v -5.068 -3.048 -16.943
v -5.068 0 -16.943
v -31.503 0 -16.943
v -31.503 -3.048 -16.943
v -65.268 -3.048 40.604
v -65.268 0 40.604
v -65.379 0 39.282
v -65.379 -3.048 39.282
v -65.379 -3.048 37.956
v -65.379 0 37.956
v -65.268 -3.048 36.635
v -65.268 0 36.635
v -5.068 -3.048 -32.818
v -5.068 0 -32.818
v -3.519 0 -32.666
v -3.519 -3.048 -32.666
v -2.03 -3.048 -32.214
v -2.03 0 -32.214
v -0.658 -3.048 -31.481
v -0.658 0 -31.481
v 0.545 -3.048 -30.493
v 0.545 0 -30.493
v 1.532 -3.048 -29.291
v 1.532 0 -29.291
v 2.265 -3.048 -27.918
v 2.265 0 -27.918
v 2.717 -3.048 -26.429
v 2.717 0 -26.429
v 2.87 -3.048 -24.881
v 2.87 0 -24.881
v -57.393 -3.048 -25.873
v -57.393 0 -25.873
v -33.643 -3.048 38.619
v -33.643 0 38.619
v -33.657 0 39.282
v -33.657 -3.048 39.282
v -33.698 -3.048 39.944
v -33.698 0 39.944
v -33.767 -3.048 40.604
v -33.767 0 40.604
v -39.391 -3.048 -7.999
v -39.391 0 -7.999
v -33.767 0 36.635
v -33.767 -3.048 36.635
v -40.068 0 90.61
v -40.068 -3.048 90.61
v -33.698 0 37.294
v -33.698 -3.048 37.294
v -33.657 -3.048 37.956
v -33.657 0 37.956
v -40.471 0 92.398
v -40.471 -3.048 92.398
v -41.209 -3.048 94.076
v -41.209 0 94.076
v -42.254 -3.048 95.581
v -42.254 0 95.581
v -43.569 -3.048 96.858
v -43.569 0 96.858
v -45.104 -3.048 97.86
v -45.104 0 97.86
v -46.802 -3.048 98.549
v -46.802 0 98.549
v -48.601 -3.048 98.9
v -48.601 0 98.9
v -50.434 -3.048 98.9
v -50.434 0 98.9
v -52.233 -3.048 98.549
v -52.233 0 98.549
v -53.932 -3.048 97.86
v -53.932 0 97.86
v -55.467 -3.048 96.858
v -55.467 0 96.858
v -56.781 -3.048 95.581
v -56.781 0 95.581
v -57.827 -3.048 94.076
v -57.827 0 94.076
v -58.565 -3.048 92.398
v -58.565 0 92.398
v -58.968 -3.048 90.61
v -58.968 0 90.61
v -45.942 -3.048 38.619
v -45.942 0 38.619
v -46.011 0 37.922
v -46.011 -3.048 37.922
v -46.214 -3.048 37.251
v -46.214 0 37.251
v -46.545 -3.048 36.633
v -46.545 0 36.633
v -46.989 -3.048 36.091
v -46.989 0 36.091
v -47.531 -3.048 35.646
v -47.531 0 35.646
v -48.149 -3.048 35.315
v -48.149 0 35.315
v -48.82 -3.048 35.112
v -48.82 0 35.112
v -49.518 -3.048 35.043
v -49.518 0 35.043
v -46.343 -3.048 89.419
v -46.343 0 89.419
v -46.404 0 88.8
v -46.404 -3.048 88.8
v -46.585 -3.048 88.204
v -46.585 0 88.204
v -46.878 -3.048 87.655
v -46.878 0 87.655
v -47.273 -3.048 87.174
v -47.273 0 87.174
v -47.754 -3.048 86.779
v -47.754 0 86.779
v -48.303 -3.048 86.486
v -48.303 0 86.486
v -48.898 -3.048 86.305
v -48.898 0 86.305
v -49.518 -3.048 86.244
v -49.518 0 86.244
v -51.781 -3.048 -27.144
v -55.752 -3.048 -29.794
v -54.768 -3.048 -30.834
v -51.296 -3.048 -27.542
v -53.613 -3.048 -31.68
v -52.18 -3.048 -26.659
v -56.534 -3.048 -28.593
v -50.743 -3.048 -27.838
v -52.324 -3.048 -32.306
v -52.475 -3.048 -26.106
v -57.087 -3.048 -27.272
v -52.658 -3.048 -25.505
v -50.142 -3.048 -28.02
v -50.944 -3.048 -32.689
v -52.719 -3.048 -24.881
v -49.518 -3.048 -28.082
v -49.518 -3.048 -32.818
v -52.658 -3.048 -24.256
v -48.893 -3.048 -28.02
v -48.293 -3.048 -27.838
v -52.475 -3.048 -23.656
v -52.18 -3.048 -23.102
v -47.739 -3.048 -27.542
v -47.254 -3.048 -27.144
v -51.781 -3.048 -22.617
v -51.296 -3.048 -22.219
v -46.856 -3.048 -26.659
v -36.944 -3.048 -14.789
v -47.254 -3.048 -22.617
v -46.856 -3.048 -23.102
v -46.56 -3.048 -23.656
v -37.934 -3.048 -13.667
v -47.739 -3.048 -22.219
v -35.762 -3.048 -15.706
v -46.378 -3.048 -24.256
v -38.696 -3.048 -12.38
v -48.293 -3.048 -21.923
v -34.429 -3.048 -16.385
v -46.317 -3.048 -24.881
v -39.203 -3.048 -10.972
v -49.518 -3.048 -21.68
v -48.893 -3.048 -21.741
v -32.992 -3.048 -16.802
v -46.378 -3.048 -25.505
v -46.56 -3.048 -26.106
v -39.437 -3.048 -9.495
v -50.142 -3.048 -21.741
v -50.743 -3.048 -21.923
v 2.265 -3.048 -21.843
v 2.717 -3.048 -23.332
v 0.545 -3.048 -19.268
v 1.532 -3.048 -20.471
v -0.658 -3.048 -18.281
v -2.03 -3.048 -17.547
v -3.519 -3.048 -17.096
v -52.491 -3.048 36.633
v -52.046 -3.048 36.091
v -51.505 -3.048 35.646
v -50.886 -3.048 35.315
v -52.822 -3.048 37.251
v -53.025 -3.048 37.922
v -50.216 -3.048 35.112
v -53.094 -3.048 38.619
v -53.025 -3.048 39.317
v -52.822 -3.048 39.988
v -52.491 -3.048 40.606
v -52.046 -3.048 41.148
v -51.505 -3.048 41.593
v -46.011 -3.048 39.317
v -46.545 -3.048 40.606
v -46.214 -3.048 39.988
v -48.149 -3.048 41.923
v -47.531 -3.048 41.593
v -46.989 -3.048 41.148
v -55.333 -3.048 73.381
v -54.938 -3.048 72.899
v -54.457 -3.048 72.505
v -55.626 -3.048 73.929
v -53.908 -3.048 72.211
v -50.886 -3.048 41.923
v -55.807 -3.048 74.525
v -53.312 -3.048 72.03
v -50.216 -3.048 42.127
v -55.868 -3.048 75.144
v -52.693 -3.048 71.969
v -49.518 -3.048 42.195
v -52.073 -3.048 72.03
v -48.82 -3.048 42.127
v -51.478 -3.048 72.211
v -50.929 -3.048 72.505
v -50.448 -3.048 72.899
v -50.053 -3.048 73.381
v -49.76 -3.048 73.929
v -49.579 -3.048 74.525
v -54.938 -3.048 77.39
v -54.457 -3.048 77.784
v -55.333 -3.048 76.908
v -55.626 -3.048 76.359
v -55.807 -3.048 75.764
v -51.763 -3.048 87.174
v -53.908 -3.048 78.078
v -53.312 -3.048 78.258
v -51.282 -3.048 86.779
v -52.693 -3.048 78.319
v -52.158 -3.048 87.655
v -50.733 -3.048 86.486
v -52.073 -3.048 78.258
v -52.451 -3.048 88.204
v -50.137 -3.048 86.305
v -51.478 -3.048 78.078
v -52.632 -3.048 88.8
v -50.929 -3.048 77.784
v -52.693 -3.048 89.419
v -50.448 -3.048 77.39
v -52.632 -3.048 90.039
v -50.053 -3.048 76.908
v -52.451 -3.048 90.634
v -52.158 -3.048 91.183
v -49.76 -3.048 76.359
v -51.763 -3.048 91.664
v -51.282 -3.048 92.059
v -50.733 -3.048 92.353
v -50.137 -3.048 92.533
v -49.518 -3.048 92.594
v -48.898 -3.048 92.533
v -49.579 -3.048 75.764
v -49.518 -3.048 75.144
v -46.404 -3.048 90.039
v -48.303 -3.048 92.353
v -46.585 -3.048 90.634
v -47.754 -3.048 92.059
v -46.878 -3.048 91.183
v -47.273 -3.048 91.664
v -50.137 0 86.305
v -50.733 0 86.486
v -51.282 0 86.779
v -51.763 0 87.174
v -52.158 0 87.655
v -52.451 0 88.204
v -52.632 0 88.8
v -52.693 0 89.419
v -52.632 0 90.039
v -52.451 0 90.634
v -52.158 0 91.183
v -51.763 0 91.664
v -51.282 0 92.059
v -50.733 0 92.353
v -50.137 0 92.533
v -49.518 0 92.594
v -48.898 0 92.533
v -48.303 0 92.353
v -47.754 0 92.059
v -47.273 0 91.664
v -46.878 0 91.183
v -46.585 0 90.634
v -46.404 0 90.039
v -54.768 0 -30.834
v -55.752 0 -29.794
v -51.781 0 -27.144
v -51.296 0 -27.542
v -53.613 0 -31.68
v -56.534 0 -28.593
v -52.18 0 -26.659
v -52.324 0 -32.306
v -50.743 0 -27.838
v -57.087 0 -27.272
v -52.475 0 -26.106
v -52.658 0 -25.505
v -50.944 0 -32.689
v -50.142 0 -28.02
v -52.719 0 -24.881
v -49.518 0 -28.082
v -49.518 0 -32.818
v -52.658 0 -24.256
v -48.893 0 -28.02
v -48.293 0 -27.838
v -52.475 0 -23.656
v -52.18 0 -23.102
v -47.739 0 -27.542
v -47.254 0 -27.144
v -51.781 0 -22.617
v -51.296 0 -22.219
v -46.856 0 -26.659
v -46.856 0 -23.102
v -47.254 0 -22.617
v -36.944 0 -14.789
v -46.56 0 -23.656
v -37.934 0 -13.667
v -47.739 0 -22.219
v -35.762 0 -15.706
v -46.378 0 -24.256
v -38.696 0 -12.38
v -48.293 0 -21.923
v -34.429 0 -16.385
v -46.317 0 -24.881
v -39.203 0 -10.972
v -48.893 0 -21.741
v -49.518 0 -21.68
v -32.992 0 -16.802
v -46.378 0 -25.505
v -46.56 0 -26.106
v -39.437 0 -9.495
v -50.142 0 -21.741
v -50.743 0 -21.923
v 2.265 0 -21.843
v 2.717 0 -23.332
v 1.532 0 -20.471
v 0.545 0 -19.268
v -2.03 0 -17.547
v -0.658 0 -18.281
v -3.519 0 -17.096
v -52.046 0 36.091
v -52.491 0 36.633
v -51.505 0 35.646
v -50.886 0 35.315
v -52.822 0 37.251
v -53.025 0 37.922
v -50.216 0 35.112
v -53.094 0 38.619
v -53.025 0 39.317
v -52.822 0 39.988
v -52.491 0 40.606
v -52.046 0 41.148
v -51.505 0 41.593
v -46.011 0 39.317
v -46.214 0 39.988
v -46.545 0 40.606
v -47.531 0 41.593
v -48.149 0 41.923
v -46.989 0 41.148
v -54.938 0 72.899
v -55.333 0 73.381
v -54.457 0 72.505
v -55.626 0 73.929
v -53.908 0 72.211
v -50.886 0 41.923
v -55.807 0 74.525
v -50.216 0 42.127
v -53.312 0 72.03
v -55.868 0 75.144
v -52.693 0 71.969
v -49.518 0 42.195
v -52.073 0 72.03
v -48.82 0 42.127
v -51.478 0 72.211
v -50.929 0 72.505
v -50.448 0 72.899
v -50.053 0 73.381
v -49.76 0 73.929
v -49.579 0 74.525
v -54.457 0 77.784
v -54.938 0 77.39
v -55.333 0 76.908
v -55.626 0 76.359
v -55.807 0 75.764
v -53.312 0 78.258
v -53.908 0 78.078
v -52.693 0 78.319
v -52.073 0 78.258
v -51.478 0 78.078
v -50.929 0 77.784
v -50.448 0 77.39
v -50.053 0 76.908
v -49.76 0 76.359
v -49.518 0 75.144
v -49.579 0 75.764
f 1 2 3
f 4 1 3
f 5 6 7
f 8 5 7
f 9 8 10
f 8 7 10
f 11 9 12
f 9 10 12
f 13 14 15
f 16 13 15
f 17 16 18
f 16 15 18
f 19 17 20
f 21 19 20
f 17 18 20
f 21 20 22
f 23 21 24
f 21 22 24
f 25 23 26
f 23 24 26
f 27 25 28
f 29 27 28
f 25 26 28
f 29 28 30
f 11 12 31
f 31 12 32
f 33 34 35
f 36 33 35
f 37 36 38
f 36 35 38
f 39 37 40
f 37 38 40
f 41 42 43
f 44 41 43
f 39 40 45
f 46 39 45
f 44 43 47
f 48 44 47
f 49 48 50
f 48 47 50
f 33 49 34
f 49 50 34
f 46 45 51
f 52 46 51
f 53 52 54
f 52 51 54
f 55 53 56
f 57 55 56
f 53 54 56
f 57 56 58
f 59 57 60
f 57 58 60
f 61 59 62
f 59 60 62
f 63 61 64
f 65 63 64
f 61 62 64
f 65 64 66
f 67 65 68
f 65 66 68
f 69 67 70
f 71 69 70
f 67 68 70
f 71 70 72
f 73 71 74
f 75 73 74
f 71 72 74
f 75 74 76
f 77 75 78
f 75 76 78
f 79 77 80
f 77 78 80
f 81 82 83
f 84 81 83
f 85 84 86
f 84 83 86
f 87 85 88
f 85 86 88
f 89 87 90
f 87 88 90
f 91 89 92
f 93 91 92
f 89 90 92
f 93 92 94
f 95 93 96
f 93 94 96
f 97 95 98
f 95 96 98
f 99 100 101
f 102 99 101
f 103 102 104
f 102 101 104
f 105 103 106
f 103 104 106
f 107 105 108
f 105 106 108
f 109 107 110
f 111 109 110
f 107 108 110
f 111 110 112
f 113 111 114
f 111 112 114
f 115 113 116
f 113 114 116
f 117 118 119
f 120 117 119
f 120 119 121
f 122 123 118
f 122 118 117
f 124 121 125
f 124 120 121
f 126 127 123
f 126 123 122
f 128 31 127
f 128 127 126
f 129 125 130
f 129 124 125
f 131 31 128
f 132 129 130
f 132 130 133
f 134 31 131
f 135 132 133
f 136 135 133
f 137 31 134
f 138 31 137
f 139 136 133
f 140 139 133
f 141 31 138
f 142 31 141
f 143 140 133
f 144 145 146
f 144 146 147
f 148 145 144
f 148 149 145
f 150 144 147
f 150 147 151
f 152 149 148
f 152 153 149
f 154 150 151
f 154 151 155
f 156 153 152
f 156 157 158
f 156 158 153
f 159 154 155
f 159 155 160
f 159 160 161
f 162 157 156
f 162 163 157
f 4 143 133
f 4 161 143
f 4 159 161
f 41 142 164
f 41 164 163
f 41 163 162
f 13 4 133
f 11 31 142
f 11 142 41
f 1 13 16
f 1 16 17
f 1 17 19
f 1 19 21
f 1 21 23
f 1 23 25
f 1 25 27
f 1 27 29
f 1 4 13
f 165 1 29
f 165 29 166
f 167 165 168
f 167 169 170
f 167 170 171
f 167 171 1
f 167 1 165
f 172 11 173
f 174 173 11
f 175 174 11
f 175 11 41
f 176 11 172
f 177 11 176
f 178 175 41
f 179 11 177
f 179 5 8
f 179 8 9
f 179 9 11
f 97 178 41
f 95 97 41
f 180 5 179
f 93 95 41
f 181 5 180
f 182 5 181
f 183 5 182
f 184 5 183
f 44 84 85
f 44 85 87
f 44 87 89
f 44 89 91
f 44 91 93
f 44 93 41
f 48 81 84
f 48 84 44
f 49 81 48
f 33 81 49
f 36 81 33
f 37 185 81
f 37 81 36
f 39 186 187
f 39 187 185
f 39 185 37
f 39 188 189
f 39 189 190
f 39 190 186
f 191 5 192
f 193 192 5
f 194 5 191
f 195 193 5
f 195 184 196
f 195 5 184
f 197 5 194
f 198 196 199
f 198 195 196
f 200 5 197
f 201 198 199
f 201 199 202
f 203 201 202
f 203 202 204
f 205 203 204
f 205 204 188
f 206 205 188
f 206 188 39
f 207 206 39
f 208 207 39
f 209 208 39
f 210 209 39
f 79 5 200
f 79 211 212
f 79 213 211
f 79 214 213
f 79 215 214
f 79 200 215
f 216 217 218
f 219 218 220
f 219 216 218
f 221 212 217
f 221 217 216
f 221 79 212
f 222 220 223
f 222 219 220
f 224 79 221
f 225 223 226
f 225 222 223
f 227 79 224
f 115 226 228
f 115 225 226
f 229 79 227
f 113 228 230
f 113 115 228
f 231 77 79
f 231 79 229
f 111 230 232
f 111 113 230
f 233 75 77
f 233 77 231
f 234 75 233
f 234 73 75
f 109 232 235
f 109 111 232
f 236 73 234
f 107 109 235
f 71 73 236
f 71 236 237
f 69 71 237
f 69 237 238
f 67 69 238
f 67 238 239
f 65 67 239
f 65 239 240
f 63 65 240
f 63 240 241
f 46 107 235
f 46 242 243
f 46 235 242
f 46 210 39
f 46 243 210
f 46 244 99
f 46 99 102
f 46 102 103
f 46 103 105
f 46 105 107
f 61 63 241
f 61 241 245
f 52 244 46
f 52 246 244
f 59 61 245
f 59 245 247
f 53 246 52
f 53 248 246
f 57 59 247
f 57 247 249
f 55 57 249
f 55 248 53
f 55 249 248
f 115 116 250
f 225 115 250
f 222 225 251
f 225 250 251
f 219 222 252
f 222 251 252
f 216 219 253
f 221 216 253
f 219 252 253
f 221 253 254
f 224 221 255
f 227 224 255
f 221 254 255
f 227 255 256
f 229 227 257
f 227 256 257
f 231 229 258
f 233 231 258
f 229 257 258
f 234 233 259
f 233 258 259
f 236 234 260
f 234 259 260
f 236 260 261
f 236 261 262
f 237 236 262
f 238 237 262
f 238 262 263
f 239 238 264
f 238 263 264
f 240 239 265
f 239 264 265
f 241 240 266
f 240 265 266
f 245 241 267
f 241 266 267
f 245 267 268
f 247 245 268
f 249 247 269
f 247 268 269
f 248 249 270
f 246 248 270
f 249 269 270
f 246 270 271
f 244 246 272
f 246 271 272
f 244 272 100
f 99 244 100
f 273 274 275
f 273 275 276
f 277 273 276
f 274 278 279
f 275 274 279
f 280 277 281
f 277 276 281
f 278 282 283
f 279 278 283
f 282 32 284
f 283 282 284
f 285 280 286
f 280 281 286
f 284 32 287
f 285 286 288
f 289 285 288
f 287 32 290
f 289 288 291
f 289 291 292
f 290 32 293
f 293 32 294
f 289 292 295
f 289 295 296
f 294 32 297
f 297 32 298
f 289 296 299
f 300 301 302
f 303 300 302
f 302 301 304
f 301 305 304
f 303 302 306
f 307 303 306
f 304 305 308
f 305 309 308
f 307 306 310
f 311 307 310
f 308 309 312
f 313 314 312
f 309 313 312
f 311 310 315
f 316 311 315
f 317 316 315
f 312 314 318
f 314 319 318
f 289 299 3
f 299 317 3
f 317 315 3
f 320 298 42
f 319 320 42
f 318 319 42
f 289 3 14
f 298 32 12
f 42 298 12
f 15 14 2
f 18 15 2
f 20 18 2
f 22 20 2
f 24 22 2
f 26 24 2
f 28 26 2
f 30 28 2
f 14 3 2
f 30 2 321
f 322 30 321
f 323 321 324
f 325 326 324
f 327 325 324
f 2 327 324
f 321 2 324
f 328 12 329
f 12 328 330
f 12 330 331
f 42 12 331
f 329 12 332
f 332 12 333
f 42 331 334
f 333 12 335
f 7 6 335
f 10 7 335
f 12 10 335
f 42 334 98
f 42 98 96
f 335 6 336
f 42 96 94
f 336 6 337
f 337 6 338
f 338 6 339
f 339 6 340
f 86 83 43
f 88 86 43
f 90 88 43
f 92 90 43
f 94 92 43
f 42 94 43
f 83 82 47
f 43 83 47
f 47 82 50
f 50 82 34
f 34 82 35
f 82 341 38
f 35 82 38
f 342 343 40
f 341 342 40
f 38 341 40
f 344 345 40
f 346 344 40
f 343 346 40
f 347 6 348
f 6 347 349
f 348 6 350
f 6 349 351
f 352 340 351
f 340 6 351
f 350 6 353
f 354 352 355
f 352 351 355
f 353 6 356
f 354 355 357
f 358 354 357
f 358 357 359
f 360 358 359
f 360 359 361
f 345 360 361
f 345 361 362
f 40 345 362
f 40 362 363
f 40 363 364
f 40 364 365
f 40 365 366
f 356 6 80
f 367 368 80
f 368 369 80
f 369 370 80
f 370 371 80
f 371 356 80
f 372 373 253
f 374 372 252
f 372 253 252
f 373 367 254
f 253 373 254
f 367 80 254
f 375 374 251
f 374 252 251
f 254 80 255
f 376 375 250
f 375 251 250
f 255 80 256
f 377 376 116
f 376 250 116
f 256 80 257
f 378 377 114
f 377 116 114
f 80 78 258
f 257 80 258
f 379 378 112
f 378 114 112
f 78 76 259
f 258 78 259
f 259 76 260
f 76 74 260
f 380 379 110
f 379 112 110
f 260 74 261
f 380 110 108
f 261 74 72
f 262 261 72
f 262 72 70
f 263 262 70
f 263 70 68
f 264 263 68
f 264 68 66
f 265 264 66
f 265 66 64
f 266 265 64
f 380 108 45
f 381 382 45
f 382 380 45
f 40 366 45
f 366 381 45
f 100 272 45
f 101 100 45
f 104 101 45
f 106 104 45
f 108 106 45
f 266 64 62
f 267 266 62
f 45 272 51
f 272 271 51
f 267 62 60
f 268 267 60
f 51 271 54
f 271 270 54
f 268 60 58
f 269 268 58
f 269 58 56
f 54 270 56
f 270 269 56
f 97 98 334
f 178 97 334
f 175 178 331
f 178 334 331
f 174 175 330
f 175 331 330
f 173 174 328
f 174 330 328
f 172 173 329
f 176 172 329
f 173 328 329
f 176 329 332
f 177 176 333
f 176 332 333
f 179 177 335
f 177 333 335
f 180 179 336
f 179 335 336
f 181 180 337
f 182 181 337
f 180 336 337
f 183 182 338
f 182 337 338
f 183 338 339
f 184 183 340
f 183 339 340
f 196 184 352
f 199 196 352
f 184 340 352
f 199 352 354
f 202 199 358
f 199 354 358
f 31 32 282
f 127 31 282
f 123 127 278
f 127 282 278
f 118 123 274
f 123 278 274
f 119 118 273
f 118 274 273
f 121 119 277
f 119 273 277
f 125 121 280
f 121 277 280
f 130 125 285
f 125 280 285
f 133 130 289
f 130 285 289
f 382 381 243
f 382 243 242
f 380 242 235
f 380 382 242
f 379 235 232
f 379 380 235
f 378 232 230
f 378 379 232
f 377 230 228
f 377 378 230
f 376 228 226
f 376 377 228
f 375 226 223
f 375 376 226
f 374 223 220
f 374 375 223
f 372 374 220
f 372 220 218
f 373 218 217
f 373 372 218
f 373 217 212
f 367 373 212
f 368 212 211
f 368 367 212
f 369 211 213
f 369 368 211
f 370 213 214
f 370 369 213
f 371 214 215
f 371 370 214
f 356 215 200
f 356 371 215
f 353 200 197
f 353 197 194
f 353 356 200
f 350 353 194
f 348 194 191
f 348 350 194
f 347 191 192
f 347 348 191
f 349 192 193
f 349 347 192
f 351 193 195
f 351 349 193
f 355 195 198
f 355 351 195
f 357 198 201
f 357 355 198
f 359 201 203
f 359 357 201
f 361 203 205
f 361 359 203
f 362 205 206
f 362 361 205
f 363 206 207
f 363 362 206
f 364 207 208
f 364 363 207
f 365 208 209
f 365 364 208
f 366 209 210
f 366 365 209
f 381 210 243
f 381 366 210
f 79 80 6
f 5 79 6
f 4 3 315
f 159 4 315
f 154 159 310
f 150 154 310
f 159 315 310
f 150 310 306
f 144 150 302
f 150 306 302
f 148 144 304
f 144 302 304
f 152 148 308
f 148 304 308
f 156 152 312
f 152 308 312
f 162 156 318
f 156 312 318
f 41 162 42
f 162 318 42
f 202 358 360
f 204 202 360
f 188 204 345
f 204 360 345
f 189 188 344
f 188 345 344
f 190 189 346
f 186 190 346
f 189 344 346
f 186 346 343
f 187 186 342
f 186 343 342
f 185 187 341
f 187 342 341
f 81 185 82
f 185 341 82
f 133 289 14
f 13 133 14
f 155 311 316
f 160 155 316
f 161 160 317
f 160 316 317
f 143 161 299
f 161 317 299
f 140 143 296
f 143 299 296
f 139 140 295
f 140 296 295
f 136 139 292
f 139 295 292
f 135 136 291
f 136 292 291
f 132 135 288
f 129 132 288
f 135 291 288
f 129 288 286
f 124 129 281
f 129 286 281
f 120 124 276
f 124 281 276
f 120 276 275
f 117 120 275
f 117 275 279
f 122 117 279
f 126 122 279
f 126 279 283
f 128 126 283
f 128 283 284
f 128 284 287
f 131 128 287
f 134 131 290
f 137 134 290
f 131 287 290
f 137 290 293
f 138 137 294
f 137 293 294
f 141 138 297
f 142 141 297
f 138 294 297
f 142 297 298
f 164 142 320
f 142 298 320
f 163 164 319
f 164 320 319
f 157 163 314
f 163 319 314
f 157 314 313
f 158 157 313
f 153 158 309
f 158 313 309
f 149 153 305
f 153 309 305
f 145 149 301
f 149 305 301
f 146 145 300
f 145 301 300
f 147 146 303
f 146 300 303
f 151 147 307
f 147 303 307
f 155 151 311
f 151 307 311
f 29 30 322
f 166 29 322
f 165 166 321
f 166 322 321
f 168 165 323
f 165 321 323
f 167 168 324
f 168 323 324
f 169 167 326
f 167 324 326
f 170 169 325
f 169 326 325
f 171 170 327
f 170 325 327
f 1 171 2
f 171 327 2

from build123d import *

# Parameters (mm, degrees)
F0_R     = 3.175
F1_DEPTH = 3.048


with BuildPart() as f1:
    # F0 (on Front) → F1 (new body)
    with BuildSketch(Plane.XZ):
        with BuildLine():
            ThreePointArc((-58.9681591883, 90.6098637193), (-56.6616162241, 83.1190434099), (-49.5178662241, 79.8942387193))
            ThreePointArc((-49.5178662241, 79.8942387193), (-42.7826741332, 82.6840466285), (-39.9928662241, 89.4192387193))
            ThreePointArc((-39.9928662241, 89.4192387193), (-40.0115613298, 90.0157219613), (-40.0675732598, 90.6098637193))
            ThreePointArc((-40.0675732598, 90.6098637193), (-49.5178662241, 98.9442387193), (-58.9681591883, 90.6098637193))
        make_face()
        with BuildLine():
            ThreePointArc((-46.3428662241, 89.4192387193), (-47.2728021938, 87.1741746891), (-49.5178662241, 86.2442387193))
            ThreePointArc((-49.5178662241, 86.2442387193), (-51.7629302543, 91.6643027496), (-46.3428662241, 89.4192387193))
        make_face(mode=Mode.SUBTRACT)
        with BuildLine():
            ThreePointArc((-39.9928662241, 89.4192387193), (-42.7826741332, 82.6840466285), (-49.5178662241, 79.8942387193))
            Line((-49.5178662241, 79.8942387193), (-49.5178662241, 75.1444387193))
            Line((-49.5178662241, 75.1444387193), (-49.5178662241, 54.4942387193))
            ThreePointArc((-49.5178662241, 54.4942387193), (-39.0175407083, 50.5254887193), (-33.7673779504, 40.6036137193))
            Line((-33.7673779504, 40.6036137193), (-40.0675732598, 90.6098637193))
            ThreePointArc((-40.0675732598, 90.6098637193), (-40.0115613298, 90.0157219613), (-39.9928662241, 89.4192387193))
        make_face()
        with BuildLine():
            Line((-49.5178662241, 75.1444387193), (-49.5178662241, 79.8942387193))
            ThreePointArc((-49.5178662241, 79.8942387193), (-56.6616162241, 83.1190434099), (-58.9681591883, 90.6098637193))
            Line((-58.9681591883, 90.6098637193), (-65.2683544977, 40.6036137193))
            ThreePointArc((-65.2683544977, 40.6036137193), (-60.0181917398, 50.5254887193), (-49.5178662241, 54.4942387193))
            Line((-49.5178662241, 54.4942387193), (-49.5178662241, 75.1444387193))
        make_face()
        with Locations((-52.6928662241, 75.1444387193)):
            Circle(F0_R, mode=Mode.SUBTRACT)
        with BuildLine():
            ThreePointArc((-33.7673779504, 40.6036137193), (-39.0175407083, 50.5254887193), (-49.5178662241, 54.4942387193))
            Line((-49.5178662241, 54.4942387193), (-49.5178662241, 42.1952313846))
            ThreePointArc((-49.5178662241, 42.1952313846), (-46.9892575609, 41.1478473825), (-45.9418735588, 38.6192387193))
            ThreePointArc((-45.9418735588, 38.6192387193), (-46.9892575609, 36.0906300562), (-49.5178662241, 35.043246054))
            Line((-49.5178662241, 35.043246054), (-49.5178662241, 22.7442387193))
            ThreePointArc((-49.5178662241, 22.7442387193), (-39.0175407083, 26.7129887193), (-33.7673779504, 36.6348637193))
            ThreePointArc((-33.7673779504, 36.6348637193), (-33.6740247337, 37.6250999827), (-33.6428662241, 38.6192387193))
            ThreePointArc((-33.6428662241, 38.6192387193), (-33.6740247337, 39.613377456), (-33.7673779504, 40.6036137193))
        make_face()
        with BuildLine():
            Line((-49.5178662241, 42.1952313846), (-49.5178662241, 54.4942387193))
            ThreePointArc((-49.5178662241, 54.4942387193), (-60.0181917398, 50.5254887193), (-65.2683544977, 40.6036137193))
            ThreePointArc((-65.2683544977, 40.6036137193), (-65.3928662241, 38.6192387193), (-65.2683544977, 36.6348637193))
            ThreePointArc((-65.2683544977, 36.6348637193), (-60.0181917398, 26.7129887193), (-49.5178662241, 22.7442387193))
            Line((-49.5178662241, 22.7442387193), (-49.5178662241, 35.043246054))
            ThreePointArc((-49.5178662241, 35.043246054), (-53.0938588894, 38.6192387193), (-49.5178662241, 42.1952313846))
        make_face()
        with BuildLine():
            ThreePointArc((-49.5178662241, 22.7442387193), (-60.0181917398, 26.7129887193), (-65.2683544977, 36.6348637193))
            Line((-65.2683544977, 36.6348637193), (-57.3931103609, -25.8729487807))
            ThreePointArc((-57.3931103609, -25.8729487807), (-55.4709912241, -19.6305985228), (-49.5178662241, -16.9432612807))
            Line((-49.5178662241, -16.9432612807), (-49.5178662241, 22.7442387193))
        make_face()
        with BuildLine():
            ThreePointArc((-33.7673779504, 36.6348637193), (-39.0175407083, 26.7129887193), (-49.5178662241, 22.7442387193))
            Line((-49.5178662241, 22.7442387193), (-49.5178662241, -16.9432612807))
            ThreePointArc((-49.5178662241, -16.9432612807), (-43.9052061484, -19.268101205), (-41.5803662241, -24.8807612807))
            Line((-41.5803662241, -24.8807612807), (-13.0053662241, -24.8807612807))
            ThreePointArc((-13.0053662241, -24.8807612807), (-10.6805262997, -19.268101205), (-5.0678662241, -16.9432612807))
            Line((-5.0678662241, -16.9432612807), (-31.5029077506, -16.9432612807))
            ThreePointArc((-31.5029077506, -16.9432612807), (-37.4655577506, -14.251624299), (-39.390752278, -7.9992862807))
            Line((-39.390752278, -7.9992862807), (-33.7673779504, 36.6348637193))
        make_face()
        with BuildLine():
            ThreePointArc((-49.5178662241, -16.9432612807), (-55.4709912241, -19.6305985228), (-57.3931103609, -25.8729487807))
            ThreePointArc((-57.3931103609, -25.8729487807), (-54.7680289819, -30.8338862807), (-49.5178662241, -32.8182612807))
            ThreePointArc((-49.5178662241, -32.8182612807), (-43.9052061484, -30.4934213563), (-41.5803662241, -24.8807612807))
            Line((-41.5803662241, -24.8807612807), (-46.3166417574, -24.8807612807))
            ThreePointArc((-46.3166417574, -24.8807612807), (-51.7814737525, -27.1443688092), (-49.5178662241, -21.679536814))
            Line((-49.5178662241, -21.679536814), (-49.5178662241, -16.9432612807))
        make_face()
        with BuildLine():
            ThreePointArc((-41.5803662241, -24.8807612807), (-43.9052061484, -30.4934213563), (-49.5178662241, -32.8182612807))
            Line((-49.5178662241, -32.8182612807), (-5.0678662241, -32.8182612807))
            ThreePointArc((-5.0678662241, -32.8182612807), (-10.6805262997, -30.4934213563), (-13.0053662241, -24.8807612807))
            Line((-13.0053662241, -24.8807612807), (-41.5803662241, -24.8807612807))
        make_face()
        with BuildLine():
            ThreePointArc((-13.0053662241, -24.8807612807), (-10.6805262997, -30.4934213563), (-5.0678662241, -32.8182612807))
            ThreePointArc((-5.0678662241, -32.8182612807), (0.5447938516, -30.4934213563), (2.8696337759, -24.8807612807))
            ThreePointArc((2.8696337759, -24.8807612807), (0.5447938516, -19.268101205), (-5.0678662241, -16.9432612807))
            ThreePointArc((-5.0678662241, -16.9432612807), (-10.6805262997, -19.268101205), (-13.0053662241, -24.8807612807))
        make_face()
        with BuildLine():
            ThreePointArc((-41.5803662241, -24.8807612807), (-43.9052061484, -19.268101205), (-49.5178662241, -16.9432612807))
            Line((-49.5178662241, -16.9432612807), (-49.5178662241, -21.679536814))
            ThreePointArc((-49.5178662241, -21.679536814), (-47.2542586956, -22.6171537522), (-46.3166417574, -24.8807612807))
            Line((-46.3166417574, -24.8807612807), (-41.5803662241, -24.8807612807))
        make_face()
    extrude(amount=F1_DEPTH)


solid = f1.part
